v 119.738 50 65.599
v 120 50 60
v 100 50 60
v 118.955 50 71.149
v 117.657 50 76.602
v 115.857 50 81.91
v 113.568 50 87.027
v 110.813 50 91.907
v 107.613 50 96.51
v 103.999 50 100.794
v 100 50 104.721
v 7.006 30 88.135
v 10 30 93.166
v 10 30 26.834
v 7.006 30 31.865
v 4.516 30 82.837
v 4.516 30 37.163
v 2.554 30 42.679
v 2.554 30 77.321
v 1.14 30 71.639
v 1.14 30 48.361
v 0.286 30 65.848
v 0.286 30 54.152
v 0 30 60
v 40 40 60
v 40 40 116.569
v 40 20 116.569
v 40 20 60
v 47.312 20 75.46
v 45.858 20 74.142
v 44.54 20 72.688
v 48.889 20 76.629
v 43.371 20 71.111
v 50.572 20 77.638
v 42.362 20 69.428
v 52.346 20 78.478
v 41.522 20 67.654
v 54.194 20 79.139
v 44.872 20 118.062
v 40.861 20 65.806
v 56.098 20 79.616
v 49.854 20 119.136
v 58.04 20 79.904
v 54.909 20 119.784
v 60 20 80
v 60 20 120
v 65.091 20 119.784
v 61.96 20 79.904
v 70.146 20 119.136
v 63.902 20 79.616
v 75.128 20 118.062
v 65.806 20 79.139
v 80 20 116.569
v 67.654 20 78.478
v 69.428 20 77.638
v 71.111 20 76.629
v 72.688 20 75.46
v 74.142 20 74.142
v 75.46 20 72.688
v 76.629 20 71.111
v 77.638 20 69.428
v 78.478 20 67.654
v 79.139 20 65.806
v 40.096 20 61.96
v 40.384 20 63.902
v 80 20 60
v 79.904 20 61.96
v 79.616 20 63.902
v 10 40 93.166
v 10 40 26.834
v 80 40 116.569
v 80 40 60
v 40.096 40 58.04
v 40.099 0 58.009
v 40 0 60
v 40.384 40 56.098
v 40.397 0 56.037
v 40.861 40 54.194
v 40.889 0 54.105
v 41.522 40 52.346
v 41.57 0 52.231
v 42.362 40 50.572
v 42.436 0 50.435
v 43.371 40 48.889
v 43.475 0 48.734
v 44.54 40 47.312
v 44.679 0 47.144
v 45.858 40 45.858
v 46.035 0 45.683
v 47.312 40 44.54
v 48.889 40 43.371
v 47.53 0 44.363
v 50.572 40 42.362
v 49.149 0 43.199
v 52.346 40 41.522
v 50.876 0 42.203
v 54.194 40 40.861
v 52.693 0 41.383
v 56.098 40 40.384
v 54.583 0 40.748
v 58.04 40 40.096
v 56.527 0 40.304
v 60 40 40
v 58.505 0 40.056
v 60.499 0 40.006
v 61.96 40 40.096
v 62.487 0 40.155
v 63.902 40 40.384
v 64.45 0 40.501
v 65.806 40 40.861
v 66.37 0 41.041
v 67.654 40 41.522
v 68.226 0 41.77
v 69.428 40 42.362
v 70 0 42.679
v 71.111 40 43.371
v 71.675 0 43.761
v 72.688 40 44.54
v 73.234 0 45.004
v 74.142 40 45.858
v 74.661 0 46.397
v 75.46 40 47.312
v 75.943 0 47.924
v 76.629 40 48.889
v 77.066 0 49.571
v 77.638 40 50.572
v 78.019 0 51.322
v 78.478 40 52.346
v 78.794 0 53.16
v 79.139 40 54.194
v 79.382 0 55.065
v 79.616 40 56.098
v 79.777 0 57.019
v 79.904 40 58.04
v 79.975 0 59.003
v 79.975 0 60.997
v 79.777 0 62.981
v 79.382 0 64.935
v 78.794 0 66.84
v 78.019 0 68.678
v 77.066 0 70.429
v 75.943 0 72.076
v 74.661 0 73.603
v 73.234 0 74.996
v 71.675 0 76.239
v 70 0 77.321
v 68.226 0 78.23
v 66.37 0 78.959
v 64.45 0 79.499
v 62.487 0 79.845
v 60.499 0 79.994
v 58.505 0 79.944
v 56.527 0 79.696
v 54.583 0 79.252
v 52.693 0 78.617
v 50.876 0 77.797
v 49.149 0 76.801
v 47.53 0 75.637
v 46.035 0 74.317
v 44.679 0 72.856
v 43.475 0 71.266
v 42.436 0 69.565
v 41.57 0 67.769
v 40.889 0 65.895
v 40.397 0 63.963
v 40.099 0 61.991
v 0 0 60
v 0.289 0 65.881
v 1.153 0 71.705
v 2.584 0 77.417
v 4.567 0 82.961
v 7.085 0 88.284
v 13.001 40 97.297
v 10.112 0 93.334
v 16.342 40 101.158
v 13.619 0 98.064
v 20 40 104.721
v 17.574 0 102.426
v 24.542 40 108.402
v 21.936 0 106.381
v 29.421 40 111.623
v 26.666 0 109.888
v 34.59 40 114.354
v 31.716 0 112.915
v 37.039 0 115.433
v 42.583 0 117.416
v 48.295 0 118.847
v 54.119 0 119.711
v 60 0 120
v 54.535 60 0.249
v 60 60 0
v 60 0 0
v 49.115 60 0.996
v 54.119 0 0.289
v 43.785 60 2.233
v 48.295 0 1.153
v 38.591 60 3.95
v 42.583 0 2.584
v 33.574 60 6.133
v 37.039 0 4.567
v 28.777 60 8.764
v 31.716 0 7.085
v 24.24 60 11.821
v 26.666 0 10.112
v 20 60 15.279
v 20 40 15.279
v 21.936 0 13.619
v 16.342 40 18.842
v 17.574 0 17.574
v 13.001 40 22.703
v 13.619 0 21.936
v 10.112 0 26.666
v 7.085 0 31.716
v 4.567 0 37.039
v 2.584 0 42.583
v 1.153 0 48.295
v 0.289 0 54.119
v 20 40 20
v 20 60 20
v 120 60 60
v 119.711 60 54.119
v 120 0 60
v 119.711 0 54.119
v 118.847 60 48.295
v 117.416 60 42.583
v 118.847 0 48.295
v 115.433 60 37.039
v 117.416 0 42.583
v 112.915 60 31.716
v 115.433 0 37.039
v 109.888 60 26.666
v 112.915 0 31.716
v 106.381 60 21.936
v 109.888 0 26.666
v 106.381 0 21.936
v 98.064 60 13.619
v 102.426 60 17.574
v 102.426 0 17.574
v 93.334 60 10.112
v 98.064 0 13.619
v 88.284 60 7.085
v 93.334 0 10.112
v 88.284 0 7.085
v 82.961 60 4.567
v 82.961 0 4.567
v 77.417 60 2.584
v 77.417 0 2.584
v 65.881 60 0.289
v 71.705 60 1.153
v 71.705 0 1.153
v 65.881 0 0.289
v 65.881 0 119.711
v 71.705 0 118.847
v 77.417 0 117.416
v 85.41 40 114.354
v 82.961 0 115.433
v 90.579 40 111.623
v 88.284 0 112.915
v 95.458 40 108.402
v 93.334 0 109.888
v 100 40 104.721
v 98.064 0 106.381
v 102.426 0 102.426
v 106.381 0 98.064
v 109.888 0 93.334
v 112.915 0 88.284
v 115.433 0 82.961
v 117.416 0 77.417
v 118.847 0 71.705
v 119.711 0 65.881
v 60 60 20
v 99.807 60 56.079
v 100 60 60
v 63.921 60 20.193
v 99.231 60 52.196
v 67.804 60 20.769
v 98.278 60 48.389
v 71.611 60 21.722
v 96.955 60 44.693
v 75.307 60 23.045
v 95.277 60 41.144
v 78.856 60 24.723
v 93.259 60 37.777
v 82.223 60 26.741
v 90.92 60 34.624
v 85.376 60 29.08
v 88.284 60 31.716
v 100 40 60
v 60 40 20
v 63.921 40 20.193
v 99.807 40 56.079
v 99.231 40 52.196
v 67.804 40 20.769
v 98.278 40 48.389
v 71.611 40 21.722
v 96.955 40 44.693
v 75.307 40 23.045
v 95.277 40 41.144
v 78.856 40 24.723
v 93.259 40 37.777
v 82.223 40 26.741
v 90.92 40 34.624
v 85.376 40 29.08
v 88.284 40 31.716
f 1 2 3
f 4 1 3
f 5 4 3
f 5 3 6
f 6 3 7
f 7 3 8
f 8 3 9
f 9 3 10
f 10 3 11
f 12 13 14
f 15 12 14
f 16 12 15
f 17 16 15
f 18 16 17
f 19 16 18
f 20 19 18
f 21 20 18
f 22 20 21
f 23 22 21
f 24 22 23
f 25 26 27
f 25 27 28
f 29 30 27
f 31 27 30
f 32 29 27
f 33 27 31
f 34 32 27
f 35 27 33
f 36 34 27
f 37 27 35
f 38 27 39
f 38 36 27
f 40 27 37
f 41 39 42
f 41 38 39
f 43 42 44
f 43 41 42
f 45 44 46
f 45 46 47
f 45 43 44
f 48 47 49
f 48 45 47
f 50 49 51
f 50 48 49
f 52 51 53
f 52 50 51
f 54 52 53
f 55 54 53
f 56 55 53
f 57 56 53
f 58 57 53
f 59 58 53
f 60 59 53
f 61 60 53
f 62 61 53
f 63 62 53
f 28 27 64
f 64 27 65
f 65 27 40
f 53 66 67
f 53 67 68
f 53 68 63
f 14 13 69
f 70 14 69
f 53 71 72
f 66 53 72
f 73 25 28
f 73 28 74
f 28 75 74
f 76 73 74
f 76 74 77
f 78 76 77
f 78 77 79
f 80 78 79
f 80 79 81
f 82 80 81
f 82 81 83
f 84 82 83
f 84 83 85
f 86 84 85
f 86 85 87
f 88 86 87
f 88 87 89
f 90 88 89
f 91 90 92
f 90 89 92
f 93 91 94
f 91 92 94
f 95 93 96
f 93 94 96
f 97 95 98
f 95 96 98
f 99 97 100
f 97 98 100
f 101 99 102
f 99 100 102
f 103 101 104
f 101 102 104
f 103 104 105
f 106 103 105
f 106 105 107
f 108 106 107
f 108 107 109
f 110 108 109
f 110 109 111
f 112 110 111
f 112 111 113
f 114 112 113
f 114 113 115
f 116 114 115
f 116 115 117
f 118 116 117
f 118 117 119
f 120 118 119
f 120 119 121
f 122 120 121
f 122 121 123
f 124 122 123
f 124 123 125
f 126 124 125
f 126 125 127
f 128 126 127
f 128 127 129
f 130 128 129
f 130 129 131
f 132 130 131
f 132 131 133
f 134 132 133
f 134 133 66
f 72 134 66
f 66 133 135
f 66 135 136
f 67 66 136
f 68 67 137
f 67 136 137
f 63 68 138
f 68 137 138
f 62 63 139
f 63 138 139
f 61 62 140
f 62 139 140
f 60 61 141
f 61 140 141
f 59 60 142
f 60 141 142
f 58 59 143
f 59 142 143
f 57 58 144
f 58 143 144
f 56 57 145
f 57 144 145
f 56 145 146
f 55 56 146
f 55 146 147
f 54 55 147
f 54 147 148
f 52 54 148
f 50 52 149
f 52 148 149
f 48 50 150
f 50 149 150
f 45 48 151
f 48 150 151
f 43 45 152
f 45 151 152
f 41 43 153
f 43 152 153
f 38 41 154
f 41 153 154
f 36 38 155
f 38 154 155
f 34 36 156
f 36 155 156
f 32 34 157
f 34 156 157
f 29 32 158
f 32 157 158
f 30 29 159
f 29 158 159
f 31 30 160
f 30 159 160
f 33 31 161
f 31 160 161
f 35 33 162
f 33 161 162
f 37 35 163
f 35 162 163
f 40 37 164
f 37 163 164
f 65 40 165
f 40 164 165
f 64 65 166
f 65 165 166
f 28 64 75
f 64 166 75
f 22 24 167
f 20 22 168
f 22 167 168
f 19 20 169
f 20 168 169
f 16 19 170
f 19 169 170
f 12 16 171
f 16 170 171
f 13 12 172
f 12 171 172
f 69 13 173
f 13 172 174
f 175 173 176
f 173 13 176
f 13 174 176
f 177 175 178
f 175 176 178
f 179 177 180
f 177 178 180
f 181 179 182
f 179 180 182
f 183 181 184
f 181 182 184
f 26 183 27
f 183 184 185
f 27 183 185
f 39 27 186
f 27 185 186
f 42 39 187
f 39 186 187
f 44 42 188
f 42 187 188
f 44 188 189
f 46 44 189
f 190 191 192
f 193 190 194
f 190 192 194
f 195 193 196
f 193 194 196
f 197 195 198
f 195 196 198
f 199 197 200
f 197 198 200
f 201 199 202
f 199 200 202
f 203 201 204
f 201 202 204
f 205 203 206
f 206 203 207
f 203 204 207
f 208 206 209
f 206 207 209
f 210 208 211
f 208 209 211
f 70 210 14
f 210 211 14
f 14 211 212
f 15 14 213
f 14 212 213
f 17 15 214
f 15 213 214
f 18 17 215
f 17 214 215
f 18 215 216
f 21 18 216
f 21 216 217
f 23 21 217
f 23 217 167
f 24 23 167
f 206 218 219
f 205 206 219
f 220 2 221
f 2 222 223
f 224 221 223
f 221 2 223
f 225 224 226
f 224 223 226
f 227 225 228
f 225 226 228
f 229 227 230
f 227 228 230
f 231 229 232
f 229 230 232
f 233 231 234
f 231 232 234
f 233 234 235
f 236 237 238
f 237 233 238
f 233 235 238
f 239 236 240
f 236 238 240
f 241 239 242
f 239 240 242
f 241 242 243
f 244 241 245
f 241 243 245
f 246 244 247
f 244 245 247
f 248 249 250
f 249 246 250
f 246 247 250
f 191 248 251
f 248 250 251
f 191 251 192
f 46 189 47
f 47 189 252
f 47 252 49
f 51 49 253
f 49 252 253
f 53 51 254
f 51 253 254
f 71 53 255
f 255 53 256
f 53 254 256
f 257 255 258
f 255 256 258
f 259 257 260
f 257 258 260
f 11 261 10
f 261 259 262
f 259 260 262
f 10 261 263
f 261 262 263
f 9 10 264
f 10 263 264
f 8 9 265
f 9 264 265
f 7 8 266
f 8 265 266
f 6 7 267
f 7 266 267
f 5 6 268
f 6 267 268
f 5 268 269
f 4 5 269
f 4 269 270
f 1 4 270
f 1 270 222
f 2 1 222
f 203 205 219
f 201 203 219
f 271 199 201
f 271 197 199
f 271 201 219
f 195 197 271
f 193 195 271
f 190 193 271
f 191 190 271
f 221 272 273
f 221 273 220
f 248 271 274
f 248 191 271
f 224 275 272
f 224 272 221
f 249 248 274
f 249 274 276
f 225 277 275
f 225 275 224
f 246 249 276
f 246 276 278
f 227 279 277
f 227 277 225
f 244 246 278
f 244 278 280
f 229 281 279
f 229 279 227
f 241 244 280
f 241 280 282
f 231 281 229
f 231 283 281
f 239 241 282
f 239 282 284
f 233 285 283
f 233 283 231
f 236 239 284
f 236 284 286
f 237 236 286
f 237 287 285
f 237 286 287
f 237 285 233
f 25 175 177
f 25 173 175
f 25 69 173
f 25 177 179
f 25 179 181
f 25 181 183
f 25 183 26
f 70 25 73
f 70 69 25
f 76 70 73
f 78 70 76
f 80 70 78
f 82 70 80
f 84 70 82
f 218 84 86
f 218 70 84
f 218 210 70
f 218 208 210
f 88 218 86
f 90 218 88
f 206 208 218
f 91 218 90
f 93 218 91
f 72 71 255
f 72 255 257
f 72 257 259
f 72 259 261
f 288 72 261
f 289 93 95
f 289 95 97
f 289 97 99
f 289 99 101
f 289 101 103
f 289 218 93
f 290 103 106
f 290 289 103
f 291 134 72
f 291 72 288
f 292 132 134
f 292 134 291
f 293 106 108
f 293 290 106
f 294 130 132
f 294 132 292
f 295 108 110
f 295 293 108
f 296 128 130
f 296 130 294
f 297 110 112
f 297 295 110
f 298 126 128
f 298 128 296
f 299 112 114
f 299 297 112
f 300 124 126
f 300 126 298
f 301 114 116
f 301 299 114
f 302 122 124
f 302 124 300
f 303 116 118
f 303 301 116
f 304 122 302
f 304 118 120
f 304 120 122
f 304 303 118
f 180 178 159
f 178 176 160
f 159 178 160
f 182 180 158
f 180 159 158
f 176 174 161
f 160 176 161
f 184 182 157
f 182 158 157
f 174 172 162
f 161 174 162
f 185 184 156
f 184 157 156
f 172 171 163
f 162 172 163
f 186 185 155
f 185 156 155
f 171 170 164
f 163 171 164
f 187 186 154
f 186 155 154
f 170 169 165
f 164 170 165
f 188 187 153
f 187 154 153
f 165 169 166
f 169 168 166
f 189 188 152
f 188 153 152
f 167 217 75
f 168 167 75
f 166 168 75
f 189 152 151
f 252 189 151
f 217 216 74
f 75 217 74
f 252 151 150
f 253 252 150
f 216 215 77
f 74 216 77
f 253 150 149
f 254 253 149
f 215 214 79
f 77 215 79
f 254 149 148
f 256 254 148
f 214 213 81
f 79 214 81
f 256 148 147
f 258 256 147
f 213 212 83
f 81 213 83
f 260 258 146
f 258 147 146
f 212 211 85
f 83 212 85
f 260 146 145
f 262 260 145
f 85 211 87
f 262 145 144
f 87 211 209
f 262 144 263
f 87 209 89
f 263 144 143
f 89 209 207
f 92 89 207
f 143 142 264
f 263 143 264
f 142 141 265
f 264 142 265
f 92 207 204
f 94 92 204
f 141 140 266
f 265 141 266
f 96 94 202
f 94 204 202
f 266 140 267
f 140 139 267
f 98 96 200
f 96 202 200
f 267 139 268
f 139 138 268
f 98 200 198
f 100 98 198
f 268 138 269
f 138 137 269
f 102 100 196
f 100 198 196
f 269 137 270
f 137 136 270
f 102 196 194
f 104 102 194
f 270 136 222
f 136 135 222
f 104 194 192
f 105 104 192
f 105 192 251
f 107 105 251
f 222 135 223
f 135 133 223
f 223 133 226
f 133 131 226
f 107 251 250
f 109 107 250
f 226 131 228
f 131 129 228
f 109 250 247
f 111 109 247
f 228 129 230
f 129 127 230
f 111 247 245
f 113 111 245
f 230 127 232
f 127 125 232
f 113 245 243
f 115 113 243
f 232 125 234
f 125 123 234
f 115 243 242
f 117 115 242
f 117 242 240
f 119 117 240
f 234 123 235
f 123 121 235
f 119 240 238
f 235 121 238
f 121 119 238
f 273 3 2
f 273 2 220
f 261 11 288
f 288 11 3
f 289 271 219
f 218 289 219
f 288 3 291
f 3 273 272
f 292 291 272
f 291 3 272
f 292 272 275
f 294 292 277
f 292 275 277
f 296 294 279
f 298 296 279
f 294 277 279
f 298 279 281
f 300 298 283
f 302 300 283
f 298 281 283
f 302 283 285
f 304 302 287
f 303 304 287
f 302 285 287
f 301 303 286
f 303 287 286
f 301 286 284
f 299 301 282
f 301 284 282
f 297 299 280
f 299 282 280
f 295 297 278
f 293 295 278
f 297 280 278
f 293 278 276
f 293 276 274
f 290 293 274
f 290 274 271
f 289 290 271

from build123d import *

# Parameters (mm, degrees)
SKETCH1_W           = 120
SKETCH1_H           = 60
BOSS_EXTRUDE1_DEPTH = 120
SKETCH2_W           = 10
SKETCH2_H           = 30
CUT_EXTRUDE1_DEPTH  = 120
SKETCH3_W           = 10
SKETCH3_H           = 20
CUT_EXTRUDE2_DEPTH  = 120
CUT_EXTRUDE3_DEPTH  = 120
SKETCH6_R           = 20
CUT_EXTRUDE4_DEPTH  = 120
CUT_EXTRUDE5_DEPTH  = 20
CUT_EXTRUDE8_DEPTH  = 20
SKETCH9_W           = 15
SKETCH9_H           = 10
CUT_EXTRUDE10_DEPTH = 20
SKETCH10_W          = 29.72135955
SKETCH10_H          = 10
CUT_EXTRUDE11_DEPTH = 20
CUT_EXTRUDE12_DEPTH = 20
SKETCH12_W          = 40
SKETCH12_H          = 20
CUT_EXTRUDE15_DEPTH = 20
SKETCH14_W          = 20
SKETCH14_H          = 40
BOSS_EXTRUDE6_DEPTH = 20


with BuildPart() as part:
    # Sketch1 → Boss-Extrude1 (new body)
    with BuildSketch(Plane.XY):
        with Locations((60, 30)):
            Rectangle(SKETCH1_W, SKETCH1_H)
    extrude(amount=BOSS_EXTRUDE1_DEPTH)

    # Sketch2 → Cut-Extrude1 (cut)
    with BuildSketch(Plane.XY.offset(120)):
        with Locations((5, 45)):
            Rectangle(SKETCH2_W, SKETCH2_H)
    extrude(amount=-CUT_EXTRUDE1_DEPTH, mode=Mode.SUBTRACT)

    # Sketch3 → Cut-Extrude2 (cut)
    with BuildSketch(Plane.XY.offset(120)):
        with Locations((15, 50)):
            Rectangle(SKETCH3_W, SKETCH3_H)
    extrude(amount=-CUT_EXTRUDE2_DEPTH, mode=Mode.SUBTRACT)

    # Sketch5 → Cut-Extrude3 (cut)
    with BuildSketch(Plane.XZ):
        with BuildLine():
            Line((60, 120), (0, 120))
            Line((0, 120), (0, 60))
            ThreePointArc((0, 60), (17.573593129, 102.426406871), (60, 120))
        make_face()
        with BuildLine():
            Line((120, 120), (60, 120))
            ThreePointArc((60, 120), (102.426406871, 102.426406871), (120, 60))
            Line((120, 60), (120, 120))
        make_face()
        with BuildLine():
            ThreePointArc((120, 60), (102.426406871, 17.573593129), (60, 0))
            Line((60, 0), (120, 0))
            Line((120, 0), (120, 60))
        make_face()
        with BuildLine():
            ThreePointArc((60, 0), (17.573593129, 17.573593129), (0, 60))
            Line((0, 60), (0, 0))
            Line((0, 0), (60, 0))
        make_face()
    extrude(amount=-CUT_EXTRUDE3_DEPTH, mode=Mode.SUBTRACT)

    # Sketch6 → Cut-Extrude4 (cut)
    with BuildSketch(Plane(origin=(0, 0, 0), x_dir=(-1, 0, 0), z_dir=(0, -1, 0))):
        with Locations((-60, -60)):
            Circle(SKETCH6_R)
    extrude(amount=-CUT_EXTRUDE4_DEPTH, mode=Mode.SUBTRACT)

    # Sketch7 → Cut-Extrude5 (cut)
    with BuildSketch(Plane(origin=(0, 60, 0), x_dir=(1, 0, 0), z_dir=(0, 1, 0))):
        with BuildLine():
            Line((40, -60), (40, -116.568542495))
            ThreePointArc((40, -116.568542495), (60, -120), (80, -116.568542495))
            Line((80, -116.568542495), (80, -60))
            ThreePointArc((80, -60), (60, -80), (40, -60))
        make_face()
    extrude(amount=-CUT_EXTRUDE5_DEPTH, mode=Mode.SUBTRACT)

    # Sketch8 → Cut-Extrude8 (cut)
    with BuildSketch(Plane(origin=(0, 60, 0), x_dir=(1, 0, 0), z_dir=(0, 1, 0))):
        with BuildLine():
            ThreePointArc((100, -60), (88.284271247, -31.715728753), (60, -20))
            Line((60, -20), (20, -20))
            Line((20, -20), (20, -104.72135955))
            ThreePointArc((20, -104.72135955), (29.420776074, -111.622776602), (40, -116.568542495))
            Line((40, -116.568542495), (40, -60))
            ThreePointArc((40, -60), (60, -40), (80, -60))
            Line((80, -60), (80, -116.568542495))
            ThreePointArc((80, -116.568542495), (90.579223926, -111.622776602), (100, -104.72135955))
            Line((100, -104.72135955), (100, -60))
        make_face()
    extrude(amount=-CUT_EXTRUDE8_DEPTH, mode=Mode.SUBTRACT)

    # Sketch9 → Cut-Extrude10 (cut)
    with BuildSketch(Plane.ZY.offset(-100)):
        with Locations((97.22135955, 55)):
            Rectangle(SKETCH9_W, SKETCH9_H)
    extrude(amount=-CUT_EXTRUDE10_DEPTH, mode=Mode.SUBTRACT)

    # Sketch10 → Cut-Extrude11 (cut)
    with BuildSketch(Plane.ZY.offset(-100)):
        with Locations((74.860679775, 55)):
            Rectangle(SKETCH10_W, SKETCH10_H)
    extrude(amount=-CUT_EXTRUDE11_DEPTH, mode=Mode.SUBTRACT)

    # Sketch11 → Cut-Extrude12 (cut)
    with BuildSketch(Plane(origin=(0, 40, 0), x_dir=(1, 0, 0), z_dir=(0, 1, 0))):
        with BuildLine():
            Line((40, -60), (40, -116.568542495))
            ThreePointArc((40, -116.568542495), (60, -120), (80, -116.568542495))
            Line((80, -116.568542495), (80, -60))
            ThreePointArc((80, -60), (60, -80), (40, -60))
        make_face()
    extrude(amount=-CUT_EXTRUDE12_DEPTH, mode=Mode.SUBTRACT)

    # Sketch12 → Cut-Extrude15 (cut)
    with BuildSketch(Plane(origin=(40, 0, 0), x_dir=(0, 0, -1), z_dir=(1, 0, 0))):
        with Locations((-60, 30)):
            Rectangle(SKETCH12_W, SKETCH12_H)
    extrude(amount=-CUT_EXTRUDE15_DEPTH, mode=Mode.SUBTRACT)

    # Sketch14 → Boss-Extrude6 (add)
    with BuildSketch(Plane(origin=(0, 40, 0), x_dir=(1, 0, 0), z_dir=(0, 1, 0))):
        with Locations((30, -60)):
            Rectangle(SKETCH14_W, SKETCH14_H)
    extrude(amount=-BOSS_EXTRUDE6_DEPTH)


solid = part.part
